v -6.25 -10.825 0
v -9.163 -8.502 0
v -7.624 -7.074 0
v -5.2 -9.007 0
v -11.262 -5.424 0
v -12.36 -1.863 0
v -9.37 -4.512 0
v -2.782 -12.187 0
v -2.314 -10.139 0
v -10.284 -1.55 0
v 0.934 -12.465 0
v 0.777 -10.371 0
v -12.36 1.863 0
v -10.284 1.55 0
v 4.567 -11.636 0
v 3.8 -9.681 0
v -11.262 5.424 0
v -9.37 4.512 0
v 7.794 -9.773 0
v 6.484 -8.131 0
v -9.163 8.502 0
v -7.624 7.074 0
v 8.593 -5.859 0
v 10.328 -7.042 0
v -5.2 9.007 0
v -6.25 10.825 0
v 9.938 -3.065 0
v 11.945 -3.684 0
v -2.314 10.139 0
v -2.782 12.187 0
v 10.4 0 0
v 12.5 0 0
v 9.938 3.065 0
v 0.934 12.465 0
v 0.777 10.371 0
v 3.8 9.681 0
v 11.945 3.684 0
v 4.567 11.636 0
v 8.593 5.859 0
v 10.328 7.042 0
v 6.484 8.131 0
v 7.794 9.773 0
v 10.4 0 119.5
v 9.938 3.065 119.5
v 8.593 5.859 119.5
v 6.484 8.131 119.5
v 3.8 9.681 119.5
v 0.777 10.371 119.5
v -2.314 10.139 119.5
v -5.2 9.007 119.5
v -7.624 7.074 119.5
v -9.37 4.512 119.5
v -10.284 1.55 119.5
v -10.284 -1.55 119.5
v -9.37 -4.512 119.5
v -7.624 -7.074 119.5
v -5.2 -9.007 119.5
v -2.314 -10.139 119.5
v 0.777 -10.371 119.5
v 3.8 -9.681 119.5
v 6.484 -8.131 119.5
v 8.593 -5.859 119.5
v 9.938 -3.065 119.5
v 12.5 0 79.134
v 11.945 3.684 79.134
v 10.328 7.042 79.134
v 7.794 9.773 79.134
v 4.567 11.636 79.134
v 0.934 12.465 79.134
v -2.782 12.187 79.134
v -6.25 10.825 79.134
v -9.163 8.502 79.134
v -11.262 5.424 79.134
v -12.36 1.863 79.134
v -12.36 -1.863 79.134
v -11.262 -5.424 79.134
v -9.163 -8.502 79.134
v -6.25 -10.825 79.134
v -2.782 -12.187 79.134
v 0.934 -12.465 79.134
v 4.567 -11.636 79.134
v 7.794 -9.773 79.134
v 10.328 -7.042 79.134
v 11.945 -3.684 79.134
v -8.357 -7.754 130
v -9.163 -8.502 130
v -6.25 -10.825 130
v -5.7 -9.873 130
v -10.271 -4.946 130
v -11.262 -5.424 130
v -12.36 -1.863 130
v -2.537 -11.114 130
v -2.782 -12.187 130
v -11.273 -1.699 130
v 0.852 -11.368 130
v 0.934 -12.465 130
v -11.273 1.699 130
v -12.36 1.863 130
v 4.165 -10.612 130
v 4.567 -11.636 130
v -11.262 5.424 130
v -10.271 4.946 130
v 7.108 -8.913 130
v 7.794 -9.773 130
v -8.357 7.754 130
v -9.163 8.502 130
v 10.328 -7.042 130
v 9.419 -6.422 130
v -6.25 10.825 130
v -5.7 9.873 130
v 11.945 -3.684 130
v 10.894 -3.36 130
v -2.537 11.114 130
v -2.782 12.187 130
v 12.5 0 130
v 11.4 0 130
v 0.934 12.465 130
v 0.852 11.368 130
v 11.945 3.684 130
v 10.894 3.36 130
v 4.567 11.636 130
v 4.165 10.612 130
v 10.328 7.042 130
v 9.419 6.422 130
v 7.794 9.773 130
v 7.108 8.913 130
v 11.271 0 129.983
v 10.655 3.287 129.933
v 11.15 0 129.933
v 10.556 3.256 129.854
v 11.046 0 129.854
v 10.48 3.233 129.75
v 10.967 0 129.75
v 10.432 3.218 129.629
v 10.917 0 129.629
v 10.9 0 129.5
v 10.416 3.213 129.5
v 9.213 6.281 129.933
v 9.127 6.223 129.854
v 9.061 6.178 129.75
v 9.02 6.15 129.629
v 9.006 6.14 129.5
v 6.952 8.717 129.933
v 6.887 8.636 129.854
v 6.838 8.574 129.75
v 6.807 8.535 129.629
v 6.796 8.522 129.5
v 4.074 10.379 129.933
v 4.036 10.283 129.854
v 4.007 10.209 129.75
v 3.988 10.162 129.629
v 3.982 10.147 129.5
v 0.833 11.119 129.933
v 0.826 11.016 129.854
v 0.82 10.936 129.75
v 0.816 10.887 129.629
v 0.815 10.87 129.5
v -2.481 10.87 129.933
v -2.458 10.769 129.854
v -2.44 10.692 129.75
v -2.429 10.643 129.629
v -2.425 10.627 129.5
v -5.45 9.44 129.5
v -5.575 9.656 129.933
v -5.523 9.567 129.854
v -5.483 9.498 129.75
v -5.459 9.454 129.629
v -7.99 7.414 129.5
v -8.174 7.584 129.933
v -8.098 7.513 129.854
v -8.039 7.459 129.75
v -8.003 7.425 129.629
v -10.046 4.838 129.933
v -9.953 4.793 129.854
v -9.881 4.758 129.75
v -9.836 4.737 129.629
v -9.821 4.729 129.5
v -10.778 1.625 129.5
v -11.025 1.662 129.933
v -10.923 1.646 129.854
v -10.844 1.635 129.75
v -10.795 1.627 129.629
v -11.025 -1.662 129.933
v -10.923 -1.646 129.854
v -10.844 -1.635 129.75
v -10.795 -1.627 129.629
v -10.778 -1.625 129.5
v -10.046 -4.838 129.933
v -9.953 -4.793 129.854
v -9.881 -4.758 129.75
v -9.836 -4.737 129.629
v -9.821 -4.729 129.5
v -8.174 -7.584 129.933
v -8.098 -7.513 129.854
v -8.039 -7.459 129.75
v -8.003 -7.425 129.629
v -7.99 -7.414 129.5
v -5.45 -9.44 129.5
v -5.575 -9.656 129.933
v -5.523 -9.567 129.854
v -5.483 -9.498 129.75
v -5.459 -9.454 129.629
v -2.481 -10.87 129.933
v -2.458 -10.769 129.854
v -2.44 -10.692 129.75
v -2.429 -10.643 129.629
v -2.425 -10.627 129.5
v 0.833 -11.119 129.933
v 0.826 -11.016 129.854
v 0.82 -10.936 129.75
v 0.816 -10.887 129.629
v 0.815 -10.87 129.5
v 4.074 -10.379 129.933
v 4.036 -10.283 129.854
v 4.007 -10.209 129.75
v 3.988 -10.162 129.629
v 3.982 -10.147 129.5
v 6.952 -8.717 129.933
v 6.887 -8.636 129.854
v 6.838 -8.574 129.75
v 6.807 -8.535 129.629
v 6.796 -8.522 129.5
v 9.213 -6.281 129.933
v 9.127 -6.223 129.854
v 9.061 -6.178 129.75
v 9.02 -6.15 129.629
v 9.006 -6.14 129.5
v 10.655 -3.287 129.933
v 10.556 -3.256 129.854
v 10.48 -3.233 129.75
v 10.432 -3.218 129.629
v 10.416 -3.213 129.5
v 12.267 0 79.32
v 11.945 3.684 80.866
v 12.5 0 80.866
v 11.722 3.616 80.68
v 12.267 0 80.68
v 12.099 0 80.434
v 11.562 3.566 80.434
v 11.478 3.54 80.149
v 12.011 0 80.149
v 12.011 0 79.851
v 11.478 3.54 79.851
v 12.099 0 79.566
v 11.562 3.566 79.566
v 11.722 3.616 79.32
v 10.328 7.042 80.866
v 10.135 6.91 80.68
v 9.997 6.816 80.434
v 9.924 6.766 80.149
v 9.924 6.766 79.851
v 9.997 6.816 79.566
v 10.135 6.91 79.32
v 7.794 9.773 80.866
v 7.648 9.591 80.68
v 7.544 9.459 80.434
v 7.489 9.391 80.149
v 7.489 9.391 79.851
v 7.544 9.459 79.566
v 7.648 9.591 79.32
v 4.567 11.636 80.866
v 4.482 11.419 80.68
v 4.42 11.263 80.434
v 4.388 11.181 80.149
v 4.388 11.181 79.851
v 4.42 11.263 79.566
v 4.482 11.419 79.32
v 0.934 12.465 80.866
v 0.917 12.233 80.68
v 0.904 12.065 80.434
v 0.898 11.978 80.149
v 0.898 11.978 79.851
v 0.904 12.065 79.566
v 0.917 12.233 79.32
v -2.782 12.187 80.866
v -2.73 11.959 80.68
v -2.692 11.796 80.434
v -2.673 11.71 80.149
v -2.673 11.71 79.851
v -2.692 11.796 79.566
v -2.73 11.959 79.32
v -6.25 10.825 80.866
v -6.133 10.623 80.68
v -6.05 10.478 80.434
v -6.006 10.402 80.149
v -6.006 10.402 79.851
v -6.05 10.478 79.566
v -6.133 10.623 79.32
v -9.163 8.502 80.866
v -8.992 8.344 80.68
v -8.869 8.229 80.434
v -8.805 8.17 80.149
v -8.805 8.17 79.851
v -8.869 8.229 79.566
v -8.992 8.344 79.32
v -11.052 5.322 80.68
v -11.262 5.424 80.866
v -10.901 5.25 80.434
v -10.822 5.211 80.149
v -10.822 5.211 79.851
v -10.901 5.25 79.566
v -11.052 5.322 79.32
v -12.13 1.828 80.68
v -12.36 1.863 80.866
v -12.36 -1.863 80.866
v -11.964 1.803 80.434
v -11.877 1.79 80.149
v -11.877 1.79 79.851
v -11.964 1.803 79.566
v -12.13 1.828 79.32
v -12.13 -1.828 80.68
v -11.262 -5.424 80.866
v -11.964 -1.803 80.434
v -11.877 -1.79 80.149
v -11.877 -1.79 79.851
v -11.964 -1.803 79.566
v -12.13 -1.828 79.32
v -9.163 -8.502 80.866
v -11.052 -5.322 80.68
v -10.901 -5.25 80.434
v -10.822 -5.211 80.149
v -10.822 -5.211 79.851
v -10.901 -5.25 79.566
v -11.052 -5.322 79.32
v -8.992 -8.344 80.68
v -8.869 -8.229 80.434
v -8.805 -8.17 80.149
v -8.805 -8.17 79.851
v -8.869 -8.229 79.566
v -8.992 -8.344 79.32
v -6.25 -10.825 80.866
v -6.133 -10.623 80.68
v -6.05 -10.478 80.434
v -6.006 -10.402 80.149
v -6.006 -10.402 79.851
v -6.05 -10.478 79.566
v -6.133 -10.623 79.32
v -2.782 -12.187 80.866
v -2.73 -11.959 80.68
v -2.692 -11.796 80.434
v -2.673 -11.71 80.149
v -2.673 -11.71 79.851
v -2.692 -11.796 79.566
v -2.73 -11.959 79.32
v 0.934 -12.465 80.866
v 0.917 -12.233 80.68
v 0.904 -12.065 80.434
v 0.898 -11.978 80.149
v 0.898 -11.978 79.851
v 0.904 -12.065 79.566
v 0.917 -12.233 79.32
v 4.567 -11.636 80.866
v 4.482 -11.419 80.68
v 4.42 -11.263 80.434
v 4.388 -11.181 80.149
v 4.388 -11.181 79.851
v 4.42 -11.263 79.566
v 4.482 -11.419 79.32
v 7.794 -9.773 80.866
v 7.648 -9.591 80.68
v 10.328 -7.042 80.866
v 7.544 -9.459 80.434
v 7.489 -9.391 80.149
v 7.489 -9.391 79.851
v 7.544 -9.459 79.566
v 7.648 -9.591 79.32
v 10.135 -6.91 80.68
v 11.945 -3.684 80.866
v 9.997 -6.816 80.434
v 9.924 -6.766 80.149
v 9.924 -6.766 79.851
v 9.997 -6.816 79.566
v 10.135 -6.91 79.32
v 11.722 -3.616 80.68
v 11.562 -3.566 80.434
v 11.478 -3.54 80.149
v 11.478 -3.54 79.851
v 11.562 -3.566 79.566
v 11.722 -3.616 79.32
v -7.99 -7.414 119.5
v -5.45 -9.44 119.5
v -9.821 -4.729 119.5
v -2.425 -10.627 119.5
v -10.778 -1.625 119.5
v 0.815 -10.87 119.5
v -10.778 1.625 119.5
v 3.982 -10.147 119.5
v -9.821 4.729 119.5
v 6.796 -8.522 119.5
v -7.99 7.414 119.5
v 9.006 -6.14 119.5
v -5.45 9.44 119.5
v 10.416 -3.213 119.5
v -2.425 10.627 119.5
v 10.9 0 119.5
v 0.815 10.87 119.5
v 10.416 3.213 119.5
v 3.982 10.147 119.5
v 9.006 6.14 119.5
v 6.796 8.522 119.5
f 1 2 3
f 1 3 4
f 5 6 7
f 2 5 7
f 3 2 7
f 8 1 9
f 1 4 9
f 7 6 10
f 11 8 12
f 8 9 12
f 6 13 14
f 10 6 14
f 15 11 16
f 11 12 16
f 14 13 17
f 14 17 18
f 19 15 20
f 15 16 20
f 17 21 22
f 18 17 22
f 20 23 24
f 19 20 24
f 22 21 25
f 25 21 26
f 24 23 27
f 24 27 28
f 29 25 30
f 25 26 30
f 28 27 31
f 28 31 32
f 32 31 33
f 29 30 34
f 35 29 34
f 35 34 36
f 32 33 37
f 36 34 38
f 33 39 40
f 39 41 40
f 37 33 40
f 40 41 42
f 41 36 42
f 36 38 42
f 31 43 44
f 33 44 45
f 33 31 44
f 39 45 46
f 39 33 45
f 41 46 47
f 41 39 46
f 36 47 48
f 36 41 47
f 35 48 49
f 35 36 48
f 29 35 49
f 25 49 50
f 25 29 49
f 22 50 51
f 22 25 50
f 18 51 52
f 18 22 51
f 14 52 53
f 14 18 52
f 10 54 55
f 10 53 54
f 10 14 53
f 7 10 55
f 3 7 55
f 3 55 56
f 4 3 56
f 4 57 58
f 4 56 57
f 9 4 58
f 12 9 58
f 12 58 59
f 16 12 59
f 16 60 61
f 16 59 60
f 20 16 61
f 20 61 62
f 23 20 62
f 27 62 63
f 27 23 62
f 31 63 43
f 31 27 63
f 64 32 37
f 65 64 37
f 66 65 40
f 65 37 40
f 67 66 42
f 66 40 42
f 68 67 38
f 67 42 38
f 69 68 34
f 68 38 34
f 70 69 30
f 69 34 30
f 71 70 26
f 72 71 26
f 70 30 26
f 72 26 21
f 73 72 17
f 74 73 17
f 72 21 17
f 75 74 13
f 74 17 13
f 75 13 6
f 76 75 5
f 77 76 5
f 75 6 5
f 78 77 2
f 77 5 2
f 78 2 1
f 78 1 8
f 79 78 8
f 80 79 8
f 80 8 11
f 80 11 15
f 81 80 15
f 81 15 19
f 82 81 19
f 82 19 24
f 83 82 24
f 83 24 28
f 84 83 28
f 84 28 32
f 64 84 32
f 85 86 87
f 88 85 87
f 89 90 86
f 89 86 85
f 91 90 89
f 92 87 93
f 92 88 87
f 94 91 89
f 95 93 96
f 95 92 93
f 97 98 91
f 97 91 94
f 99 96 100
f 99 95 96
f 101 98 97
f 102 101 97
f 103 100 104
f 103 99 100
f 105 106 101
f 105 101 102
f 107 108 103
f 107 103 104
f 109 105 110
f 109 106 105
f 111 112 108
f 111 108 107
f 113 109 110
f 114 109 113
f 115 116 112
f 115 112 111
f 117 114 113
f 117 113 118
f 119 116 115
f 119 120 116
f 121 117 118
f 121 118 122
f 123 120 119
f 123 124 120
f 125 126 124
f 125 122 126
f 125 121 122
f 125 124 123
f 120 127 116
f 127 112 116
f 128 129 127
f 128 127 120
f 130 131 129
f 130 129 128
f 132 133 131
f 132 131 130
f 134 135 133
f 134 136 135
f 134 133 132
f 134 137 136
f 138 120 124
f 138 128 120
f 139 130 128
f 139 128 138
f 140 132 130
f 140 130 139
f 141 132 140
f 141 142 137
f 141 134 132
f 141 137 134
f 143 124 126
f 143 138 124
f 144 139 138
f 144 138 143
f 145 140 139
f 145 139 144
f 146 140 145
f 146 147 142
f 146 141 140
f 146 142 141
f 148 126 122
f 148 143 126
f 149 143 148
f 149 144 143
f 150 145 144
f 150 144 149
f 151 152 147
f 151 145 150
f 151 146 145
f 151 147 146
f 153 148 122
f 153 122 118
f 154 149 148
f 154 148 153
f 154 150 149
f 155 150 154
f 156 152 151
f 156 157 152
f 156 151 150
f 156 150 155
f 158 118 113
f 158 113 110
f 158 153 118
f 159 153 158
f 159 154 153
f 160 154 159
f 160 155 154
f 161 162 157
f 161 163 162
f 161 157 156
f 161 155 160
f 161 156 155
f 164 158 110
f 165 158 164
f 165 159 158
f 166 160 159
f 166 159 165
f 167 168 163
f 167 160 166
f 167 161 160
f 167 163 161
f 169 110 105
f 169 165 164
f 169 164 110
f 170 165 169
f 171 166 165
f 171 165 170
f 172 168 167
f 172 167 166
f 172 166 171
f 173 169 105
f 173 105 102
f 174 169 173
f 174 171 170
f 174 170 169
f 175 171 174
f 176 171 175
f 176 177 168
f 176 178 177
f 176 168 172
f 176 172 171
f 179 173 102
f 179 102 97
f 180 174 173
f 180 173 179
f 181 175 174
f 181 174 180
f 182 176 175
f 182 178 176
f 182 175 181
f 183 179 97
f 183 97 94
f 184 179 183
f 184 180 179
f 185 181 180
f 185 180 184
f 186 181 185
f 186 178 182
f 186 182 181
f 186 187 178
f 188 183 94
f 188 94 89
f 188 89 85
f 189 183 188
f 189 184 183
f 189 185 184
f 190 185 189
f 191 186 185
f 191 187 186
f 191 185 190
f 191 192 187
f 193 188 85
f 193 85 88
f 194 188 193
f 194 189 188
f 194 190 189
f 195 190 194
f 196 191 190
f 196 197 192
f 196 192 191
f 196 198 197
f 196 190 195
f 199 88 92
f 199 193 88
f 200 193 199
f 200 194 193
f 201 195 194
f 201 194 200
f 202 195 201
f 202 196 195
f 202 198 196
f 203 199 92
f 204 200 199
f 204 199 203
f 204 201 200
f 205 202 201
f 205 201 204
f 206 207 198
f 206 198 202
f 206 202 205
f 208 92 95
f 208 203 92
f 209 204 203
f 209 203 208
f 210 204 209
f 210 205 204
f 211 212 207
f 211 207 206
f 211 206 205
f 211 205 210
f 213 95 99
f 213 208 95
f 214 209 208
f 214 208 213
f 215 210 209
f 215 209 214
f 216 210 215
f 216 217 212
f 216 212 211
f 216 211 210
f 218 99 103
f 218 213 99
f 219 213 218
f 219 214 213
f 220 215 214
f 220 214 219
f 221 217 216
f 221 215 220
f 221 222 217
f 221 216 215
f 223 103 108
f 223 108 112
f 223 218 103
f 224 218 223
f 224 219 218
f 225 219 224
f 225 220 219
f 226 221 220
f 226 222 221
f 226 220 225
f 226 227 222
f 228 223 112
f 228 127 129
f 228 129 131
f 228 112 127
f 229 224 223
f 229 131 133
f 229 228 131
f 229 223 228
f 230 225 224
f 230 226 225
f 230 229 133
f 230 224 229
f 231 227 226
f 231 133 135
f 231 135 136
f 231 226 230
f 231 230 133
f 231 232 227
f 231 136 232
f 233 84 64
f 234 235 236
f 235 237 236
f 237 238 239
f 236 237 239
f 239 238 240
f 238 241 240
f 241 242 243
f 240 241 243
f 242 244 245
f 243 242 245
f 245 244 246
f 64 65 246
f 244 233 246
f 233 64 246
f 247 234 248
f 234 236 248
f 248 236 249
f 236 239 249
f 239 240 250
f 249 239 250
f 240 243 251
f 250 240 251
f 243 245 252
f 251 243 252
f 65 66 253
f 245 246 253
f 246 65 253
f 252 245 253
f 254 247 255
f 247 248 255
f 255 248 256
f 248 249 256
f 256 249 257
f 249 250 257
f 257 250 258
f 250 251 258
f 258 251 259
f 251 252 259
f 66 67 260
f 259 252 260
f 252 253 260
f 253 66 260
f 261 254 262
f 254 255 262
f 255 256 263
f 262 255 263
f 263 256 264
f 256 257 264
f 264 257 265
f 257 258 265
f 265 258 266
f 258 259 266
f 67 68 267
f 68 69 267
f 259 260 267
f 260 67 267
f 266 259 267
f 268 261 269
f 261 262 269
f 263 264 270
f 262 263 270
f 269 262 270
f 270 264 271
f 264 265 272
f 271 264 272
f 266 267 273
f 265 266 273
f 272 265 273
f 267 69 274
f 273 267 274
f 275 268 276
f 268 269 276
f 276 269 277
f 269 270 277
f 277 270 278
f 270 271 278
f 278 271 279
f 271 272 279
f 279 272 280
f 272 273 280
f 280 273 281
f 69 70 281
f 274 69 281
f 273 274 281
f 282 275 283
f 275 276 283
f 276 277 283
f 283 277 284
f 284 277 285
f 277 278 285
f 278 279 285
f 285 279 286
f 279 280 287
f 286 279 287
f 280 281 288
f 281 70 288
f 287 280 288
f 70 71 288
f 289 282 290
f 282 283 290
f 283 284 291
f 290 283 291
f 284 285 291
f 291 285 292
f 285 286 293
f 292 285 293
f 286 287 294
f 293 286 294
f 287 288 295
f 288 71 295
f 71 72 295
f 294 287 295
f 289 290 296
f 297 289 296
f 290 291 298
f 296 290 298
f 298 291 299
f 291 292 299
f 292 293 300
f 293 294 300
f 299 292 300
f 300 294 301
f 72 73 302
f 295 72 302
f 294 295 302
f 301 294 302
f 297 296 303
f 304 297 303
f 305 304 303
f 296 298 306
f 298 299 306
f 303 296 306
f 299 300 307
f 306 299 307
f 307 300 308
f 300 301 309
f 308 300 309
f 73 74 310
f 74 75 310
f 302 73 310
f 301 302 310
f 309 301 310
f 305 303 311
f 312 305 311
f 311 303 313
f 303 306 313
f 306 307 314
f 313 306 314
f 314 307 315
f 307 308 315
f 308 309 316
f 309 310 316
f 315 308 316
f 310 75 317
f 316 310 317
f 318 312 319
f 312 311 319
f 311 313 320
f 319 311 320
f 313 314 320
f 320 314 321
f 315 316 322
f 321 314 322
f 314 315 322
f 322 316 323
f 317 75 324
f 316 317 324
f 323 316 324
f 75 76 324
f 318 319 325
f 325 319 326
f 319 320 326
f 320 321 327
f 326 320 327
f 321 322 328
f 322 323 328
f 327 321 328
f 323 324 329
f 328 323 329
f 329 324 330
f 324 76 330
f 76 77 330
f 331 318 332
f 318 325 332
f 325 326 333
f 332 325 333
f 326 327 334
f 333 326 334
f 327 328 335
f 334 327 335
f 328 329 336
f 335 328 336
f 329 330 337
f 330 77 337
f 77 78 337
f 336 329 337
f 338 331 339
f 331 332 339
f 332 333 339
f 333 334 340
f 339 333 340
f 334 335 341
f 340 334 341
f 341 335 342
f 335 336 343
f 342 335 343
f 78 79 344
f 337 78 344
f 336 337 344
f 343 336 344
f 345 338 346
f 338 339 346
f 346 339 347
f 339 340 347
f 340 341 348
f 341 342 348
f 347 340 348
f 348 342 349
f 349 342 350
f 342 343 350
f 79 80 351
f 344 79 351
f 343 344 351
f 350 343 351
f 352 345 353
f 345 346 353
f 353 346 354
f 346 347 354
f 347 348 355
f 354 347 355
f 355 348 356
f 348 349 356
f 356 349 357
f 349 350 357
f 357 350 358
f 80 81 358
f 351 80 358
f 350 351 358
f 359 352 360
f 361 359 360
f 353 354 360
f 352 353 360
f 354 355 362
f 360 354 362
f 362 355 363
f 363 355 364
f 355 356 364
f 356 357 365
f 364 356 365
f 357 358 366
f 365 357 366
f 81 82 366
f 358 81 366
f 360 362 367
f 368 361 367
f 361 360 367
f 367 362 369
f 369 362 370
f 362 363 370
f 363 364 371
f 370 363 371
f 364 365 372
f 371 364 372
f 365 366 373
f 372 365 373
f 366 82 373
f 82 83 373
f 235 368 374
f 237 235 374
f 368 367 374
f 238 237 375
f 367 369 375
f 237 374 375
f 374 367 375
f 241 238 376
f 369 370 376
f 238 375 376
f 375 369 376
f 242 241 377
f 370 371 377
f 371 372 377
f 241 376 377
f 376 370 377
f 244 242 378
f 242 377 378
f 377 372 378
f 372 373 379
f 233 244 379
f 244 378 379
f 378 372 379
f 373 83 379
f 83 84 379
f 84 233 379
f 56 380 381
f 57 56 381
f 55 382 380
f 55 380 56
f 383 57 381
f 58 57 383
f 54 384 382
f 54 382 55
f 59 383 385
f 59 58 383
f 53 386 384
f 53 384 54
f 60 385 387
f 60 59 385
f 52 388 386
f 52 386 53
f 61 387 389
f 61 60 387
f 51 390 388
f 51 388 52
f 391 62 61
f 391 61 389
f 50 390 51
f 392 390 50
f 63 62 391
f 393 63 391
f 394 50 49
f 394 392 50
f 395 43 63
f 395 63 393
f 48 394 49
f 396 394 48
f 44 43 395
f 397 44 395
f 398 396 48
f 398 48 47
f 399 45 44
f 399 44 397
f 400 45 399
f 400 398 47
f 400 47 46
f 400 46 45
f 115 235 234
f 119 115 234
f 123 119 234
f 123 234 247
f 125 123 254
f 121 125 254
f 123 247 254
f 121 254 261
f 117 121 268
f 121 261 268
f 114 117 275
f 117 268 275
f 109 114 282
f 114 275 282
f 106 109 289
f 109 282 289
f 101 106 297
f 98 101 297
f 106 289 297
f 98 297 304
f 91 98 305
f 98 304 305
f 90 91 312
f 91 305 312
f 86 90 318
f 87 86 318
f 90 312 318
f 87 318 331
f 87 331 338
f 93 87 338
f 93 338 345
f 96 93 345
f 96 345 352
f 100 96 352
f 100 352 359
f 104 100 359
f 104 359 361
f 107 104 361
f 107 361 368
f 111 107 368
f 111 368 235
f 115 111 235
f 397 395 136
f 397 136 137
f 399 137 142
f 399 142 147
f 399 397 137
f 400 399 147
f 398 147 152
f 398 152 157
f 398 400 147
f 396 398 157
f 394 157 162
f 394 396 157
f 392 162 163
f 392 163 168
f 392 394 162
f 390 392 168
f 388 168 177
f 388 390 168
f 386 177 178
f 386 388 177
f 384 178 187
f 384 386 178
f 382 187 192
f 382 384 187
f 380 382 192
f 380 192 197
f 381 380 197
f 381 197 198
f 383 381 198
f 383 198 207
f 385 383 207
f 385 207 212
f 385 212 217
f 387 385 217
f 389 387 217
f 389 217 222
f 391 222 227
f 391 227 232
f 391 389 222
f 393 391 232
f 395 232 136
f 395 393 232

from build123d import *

# Parameters (mm, degrees)
TORUS001002001_R  = 1
CYLINDER002_R     = 10.9
CYLINDER002_DEPTH = 10.5
CYLINDER001_R     = 10.4
CYLINDER001_DEPTH = 130
CYLINDER_R        = 12.5
CYLINDER_DEPTH    = 130
FILLET_R          = 0.5


with BuildPart() as torus001002001:
    # Torus001002001 → Torus001002001 (revolve)
    with BuildSketch(Plane(origin=(0, 0, 80), x_dir=(1, 0, 0), z_dir=(0, -1, 0))):
        with Locations((13, 0)):
            Circle(TORUS001002001_R)
    revolve(axis=Axis((0, 0, 80), (0, 0, 1)))


with BuildPart() as cylinder002:
    # Cylinder002 → Cylinder002 (new body)
    with BuildSketch(Plane.XY.offset(119.5)):
        Circle(CYLINDER002_R)
    extrude(amount=CYLINDER002_DEPTH)


with BuildPart() as cylinder001:
    # Cylinder001 → Cylinder001 (new body)
    with BuildSketch(Plane.XY):
        Circle(CYLINDER001_R)
    extrude(amount=CYLINDER001_DEPTH)


with BuildPart() as fillet_body:
    # Cylinder → Cylinder (new body)
    with BuildSketch(Plane.XY):
        Circle(CYLINDER_R)
    extrude(amount=CYLINDER_DEPTH)

    # Cut: cut Cylinder001
    add(cylinder001.part, mode=Mode.SUBTRACT)

    # Cut001: cut Cylinder002
    add(cylinder002.part, mode=Mode.SUBTRACT)

    # Cut002: cut Torus001002001
    add(torus001002001.part, mode=Mode.SUBTRACT)

    # Fillet
    fillet_edges = [fillet_body.edges().sort_by_distance(p)[0] for p in [
        (-10.9, 0, 130),
    ]]
    fillet(fillet_edges, radius=FILLET_R)


solid = fillet_body.part
